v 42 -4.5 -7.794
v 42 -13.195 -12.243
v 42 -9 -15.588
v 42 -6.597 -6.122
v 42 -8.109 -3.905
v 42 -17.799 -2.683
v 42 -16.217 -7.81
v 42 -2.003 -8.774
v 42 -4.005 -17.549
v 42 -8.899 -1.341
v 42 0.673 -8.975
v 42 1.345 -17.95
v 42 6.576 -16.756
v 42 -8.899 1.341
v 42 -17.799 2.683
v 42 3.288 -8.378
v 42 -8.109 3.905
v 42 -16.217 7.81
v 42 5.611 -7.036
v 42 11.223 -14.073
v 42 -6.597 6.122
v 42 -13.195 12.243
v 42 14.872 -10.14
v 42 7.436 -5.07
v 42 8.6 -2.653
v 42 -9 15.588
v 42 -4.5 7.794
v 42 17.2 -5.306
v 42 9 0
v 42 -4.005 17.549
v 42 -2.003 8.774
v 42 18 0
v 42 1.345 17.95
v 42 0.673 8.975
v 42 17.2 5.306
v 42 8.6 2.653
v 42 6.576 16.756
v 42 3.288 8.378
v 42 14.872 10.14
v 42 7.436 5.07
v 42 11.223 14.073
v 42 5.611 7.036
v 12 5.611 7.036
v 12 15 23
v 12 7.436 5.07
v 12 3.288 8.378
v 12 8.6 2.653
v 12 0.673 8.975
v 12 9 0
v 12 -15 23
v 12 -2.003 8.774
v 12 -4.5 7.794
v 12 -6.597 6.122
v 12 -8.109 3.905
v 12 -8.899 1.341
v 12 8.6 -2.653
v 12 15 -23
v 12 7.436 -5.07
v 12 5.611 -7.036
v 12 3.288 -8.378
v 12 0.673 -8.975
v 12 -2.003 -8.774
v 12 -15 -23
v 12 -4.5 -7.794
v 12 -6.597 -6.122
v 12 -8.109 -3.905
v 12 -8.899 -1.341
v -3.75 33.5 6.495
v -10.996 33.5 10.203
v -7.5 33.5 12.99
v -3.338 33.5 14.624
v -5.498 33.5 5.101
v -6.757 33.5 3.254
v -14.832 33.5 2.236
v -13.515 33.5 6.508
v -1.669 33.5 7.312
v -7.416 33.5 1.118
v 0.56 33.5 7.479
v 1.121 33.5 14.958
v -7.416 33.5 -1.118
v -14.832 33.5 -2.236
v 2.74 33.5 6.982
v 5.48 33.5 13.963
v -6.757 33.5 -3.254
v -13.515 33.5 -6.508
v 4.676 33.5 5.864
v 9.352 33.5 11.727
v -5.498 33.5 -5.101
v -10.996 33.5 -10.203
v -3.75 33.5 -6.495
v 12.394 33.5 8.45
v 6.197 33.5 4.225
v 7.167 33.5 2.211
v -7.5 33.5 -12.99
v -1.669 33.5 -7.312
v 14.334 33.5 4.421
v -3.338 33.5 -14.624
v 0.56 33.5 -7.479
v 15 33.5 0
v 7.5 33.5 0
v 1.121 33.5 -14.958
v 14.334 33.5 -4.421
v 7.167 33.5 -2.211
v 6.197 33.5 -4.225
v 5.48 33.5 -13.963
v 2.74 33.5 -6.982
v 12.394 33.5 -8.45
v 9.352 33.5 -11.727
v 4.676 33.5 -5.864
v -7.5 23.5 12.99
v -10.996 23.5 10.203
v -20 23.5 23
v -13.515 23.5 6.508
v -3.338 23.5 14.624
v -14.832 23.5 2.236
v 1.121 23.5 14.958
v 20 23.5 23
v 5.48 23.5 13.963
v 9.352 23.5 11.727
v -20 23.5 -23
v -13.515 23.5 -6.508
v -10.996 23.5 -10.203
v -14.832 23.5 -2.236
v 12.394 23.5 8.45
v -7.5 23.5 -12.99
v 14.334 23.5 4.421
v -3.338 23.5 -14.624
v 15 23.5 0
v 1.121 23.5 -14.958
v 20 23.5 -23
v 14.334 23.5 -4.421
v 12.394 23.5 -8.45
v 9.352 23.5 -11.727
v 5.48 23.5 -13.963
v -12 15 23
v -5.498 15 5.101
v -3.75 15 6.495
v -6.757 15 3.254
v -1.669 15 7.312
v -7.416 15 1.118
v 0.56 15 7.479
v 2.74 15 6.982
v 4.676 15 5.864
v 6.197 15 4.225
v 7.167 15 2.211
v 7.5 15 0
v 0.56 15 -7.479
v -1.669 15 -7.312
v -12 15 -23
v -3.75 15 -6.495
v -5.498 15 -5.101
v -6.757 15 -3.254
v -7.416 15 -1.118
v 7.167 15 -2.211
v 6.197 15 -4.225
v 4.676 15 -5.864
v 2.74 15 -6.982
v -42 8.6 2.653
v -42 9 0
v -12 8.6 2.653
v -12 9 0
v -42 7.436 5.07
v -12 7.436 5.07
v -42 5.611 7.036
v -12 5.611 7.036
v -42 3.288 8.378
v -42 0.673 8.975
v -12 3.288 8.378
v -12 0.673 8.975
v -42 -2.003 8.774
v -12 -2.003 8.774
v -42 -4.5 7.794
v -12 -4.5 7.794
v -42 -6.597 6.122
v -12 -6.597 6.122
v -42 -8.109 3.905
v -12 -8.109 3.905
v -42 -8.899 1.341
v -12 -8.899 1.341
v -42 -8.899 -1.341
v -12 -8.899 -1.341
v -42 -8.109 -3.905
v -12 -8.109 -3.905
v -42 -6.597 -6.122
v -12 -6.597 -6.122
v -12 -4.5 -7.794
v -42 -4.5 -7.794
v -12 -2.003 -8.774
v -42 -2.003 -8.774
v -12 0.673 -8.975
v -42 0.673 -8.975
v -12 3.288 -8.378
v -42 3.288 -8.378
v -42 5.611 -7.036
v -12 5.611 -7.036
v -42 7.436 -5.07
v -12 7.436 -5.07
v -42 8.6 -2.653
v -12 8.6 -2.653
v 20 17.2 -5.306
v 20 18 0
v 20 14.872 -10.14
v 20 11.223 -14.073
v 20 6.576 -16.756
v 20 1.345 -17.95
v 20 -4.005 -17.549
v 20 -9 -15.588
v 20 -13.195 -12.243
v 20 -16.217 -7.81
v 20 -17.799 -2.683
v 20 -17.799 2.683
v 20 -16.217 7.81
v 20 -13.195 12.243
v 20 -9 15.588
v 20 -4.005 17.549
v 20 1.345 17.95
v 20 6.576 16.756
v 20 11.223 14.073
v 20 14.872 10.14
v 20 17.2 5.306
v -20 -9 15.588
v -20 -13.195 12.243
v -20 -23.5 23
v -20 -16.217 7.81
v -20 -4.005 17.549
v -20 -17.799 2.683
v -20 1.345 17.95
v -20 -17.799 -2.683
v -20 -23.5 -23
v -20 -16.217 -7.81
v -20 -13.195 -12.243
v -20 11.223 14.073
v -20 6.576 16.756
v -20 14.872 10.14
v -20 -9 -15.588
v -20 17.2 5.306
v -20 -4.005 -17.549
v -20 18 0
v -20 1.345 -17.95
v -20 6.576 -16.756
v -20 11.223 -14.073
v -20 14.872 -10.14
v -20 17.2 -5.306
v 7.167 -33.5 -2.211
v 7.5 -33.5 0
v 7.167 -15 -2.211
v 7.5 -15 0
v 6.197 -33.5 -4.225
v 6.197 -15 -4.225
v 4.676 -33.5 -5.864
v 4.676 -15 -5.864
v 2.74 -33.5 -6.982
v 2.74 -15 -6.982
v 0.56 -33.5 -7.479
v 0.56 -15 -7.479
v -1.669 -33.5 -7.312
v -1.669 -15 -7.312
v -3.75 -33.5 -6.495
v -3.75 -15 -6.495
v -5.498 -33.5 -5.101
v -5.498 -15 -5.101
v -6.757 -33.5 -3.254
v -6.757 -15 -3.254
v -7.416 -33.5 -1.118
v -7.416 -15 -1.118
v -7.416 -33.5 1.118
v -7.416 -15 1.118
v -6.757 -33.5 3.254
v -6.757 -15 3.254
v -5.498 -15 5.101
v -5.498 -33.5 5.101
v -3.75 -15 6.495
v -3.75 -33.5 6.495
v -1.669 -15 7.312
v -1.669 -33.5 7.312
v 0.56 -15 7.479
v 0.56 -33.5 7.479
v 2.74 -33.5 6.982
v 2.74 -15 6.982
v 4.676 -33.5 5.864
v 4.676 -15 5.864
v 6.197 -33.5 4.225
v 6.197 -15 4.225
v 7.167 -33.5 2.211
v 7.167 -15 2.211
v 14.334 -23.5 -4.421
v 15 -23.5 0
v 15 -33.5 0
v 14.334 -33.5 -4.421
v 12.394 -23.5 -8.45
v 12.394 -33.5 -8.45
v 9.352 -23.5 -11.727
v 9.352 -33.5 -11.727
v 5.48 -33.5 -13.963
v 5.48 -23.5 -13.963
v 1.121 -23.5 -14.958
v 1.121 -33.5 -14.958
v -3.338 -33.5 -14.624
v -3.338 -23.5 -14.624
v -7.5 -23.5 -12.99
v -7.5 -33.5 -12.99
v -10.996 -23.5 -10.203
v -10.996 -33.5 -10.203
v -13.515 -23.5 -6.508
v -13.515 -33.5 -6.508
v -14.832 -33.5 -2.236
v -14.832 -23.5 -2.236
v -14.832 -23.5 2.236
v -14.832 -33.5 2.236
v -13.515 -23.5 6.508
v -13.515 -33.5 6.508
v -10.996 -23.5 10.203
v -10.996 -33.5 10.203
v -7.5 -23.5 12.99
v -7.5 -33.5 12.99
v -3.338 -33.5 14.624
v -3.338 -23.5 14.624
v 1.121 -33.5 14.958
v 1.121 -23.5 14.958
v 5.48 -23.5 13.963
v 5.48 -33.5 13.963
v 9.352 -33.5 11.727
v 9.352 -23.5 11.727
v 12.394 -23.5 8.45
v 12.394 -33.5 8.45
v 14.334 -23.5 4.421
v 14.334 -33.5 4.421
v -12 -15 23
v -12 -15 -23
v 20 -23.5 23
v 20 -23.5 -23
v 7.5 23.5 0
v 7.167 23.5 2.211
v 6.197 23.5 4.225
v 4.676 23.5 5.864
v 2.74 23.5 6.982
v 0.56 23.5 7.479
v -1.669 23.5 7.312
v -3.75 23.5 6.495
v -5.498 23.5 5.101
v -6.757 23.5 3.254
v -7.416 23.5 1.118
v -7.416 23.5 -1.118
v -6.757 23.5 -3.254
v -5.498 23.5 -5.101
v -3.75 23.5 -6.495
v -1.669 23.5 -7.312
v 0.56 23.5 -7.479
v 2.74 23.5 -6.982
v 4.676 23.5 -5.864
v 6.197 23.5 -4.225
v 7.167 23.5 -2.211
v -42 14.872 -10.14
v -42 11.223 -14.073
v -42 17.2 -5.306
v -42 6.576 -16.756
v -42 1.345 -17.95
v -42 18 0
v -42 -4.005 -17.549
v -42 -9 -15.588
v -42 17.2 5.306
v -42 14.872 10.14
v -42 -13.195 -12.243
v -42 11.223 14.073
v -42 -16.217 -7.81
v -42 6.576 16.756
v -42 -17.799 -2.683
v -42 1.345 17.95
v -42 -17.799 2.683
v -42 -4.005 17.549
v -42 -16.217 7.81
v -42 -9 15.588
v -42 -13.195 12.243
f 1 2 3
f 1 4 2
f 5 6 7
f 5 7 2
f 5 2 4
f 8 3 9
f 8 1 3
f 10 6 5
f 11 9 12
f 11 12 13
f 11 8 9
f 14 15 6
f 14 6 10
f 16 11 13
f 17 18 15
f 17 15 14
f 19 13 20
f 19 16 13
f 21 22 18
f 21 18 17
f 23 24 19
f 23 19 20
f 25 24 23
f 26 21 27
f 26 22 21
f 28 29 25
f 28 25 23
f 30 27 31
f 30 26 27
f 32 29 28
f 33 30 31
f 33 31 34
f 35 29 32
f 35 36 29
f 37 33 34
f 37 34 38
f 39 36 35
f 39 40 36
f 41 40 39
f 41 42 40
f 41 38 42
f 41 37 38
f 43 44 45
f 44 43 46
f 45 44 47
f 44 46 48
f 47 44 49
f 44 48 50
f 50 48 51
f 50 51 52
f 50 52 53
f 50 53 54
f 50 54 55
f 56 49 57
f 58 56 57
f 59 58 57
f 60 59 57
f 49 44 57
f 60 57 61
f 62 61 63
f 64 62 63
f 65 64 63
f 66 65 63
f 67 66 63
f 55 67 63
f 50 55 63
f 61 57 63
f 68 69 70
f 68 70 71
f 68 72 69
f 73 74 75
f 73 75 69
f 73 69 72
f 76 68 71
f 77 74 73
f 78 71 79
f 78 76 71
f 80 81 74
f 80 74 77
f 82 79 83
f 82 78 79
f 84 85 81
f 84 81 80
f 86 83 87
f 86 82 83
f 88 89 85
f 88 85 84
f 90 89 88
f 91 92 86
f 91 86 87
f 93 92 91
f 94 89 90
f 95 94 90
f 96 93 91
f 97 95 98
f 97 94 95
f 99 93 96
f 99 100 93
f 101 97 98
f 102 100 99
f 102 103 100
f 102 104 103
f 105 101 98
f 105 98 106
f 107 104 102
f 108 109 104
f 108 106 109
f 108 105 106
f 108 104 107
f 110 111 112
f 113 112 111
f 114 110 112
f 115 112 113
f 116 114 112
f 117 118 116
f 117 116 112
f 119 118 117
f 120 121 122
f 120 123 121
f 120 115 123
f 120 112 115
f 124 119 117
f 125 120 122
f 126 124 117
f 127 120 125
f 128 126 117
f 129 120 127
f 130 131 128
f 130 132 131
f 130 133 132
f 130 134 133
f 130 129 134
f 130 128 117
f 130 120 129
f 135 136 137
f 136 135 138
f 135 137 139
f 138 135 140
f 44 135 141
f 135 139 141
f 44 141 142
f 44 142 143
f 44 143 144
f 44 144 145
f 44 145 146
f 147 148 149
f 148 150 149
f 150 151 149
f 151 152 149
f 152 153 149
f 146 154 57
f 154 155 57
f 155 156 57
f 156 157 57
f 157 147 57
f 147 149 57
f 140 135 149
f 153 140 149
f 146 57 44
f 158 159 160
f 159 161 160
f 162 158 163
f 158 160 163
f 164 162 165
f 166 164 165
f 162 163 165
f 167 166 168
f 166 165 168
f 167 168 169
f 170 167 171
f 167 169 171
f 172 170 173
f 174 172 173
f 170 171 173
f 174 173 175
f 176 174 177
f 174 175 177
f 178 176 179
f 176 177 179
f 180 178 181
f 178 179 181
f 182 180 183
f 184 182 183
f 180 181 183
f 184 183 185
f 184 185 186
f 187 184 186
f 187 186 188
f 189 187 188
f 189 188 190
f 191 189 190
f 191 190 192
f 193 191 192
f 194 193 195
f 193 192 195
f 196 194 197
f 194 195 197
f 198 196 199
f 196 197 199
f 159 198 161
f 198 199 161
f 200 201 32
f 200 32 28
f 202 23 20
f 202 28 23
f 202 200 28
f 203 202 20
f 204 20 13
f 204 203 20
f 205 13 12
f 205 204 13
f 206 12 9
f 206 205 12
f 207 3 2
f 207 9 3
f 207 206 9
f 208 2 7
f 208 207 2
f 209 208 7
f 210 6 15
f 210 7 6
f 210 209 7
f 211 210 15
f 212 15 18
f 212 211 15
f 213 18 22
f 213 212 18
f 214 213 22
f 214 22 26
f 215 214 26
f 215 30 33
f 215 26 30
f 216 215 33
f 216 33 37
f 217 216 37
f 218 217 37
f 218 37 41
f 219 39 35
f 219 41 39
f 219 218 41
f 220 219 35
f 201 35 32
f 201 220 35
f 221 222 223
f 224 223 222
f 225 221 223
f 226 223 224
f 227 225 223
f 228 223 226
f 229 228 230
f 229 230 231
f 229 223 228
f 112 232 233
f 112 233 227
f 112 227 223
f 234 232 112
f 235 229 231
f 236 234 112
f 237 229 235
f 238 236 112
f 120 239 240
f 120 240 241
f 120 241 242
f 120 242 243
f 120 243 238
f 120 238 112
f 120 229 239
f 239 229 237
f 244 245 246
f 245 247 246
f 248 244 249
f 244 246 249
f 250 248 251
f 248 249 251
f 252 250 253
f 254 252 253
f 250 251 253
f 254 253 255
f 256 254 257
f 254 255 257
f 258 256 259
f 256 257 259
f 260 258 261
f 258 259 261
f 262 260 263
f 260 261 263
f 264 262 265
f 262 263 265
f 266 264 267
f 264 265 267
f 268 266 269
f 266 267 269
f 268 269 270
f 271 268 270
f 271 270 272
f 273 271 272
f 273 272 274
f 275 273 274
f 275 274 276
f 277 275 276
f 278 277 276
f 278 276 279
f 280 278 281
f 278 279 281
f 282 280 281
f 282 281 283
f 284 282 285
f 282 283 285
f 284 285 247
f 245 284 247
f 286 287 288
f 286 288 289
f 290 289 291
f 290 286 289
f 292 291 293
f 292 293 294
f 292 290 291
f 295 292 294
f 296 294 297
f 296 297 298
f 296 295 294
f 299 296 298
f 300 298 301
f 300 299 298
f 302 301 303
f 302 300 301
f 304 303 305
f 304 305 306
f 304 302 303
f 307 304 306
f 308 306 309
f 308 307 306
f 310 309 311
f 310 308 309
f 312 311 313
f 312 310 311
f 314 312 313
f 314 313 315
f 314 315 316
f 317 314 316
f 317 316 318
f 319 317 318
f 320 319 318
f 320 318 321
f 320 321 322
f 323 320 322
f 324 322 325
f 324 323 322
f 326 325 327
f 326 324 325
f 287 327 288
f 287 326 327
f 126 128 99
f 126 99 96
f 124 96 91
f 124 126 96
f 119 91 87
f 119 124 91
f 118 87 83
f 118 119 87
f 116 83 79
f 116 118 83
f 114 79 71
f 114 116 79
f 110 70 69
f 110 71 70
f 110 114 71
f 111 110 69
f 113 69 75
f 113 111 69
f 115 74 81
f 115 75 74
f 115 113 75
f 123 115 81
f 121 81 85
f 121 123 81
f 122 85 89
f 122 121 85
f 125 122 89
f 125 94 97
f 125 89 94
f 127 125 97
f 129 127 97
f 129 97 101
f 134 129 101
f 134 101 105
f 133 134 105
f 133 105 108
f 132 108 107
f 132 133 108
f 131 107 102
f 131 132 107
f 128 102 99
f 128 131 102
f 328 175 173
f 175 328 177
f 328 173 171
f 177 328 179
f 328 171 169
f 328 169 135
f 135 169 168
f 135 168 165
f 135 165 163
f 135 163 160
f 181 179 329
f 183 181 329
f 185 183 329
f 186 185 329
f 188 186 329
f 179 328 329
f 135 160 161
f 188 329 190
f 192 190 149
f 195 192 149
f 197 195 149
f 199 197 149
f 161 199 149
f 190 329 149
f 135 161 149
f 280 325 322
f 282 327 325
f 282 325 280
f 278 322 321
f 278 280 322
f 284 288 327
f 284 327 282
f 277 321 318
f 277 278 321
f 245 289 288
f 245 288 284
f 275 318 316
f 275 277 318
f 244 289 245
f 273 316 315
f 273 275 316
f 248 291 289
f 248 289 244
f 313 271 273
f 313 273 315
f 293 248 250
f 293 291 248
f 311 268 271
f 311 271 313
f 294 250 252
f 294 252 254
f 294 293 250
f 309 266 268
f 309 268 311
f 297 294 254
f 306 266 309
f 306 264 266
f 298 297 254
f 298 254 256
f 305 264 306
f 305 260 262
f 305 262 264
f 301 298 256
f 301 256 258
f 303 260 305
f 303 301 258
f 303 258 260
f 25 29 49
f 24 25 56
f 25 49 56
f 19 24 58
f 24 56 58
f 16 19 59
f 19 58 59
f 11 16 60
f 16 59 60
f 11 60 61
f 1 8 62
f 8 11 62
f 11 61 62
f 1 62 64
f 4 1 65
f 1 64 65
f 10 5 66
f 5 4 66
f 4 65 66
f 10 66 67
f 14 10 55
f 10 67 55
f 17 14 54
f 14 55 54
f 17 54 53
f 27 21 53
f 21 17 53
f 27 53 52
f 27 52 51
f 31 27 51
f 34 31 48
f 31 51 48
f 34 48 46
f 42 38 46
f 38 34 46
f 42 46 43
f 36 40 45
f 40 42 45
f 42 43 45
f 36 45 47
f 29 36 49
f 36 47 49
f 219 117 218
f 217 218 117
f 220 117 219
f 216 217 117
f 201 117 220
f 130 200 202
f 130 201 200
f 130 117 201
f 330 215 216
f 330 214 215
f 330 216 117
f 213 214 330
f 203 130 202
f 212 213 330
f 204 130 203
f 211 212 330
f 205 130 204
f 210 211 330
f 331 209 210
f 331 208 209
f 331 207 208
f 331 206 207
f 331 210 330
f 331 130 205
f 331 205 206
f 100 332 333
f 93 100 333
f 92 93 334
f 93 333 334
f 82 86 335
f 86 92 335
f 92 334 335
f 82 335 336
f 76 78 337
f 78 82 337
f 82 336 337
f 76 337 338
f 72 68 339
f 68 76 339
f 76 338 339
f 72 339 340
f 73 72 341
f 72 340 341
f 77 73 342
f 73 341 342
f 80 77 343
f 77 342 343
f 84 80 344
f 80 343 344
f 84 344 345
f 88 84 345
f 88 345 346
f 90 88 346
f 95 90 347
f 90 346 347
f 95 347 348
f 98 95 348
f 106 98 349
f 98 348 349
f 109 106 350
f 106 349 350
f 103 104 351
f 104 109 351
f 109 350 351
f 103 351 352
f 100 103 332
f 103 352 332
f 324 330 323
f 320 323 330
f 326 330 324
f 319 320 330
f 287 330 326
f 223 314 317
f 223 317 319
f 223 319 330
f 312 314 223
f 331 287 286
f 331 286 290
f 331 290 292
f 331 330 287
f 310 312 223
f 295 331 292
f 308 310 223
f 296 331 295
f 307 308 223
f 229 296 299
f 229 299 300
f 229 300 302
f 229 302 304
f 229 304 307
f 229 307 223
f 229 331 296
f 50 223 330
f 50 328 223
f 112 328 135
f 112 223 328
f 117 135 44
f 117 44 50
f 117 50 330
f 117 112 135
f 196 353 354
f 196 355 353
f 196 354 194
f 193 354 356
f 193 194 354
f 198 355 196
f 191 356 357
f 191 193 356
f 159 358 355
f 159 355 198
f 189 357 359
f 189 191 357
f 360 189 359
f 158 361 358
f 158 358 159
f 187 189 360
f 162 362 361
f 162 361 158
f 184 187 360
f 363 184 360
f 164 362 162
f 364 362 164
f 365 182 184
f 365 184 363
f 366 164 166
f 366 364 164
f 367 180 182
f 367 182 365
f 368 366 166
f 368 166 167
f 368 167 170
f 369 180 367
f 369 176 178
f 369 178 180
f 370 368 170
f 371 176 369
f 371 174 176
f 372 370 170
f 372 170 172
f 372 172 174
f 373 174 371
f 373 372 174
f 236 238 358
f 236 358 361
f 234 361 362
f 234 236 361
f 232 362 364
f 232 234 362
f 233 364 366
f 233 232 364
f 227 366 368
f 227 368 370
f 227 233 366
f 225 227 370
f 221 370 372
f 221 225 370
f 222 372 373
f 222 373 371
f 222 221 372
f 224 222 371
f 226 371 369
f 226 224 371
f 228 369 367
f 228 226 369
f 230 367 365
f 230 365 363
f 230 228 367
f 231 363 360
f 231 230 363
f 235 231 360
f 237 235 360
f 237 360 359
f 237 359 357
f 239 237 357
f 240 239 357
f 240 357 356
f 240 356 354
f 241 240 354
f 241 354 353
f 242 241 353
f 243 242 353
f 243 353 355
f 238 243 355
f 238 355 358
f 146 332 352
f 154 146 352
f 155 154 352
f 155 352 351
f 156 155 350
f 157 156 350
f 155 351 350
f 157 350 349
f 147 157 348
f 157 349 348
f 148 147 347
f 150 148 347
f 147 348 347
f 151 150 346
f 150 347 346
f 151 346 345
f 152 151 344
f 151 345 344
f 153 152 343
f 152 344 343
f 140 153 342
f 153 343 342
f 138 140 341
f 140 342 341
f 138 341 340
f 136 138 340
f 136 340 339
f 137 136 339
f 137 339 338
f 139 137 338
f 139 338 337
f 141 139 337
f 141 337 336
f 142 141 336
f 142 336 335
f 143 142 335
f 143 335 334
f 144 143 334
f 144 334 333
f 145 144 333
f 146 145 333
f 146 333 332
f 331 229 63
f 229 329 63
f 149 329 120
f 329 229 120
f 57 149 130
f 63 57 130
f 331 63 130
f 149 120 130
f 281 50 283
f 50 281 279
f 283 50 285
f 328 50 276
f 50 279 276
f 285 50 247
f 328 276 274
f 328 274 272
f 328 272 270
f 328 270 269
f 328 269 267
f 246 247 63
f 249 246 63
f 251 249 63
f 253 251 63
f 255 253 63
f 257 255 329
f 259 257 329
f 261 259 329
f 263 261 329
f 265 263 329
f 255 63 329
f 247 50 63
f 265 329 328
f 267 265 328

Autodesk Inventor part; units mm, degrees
ref_plane "YZ Plane" through (0, 0, 0) normal (1, 0, 0) x (0, 1, 0)
ref_plane "XZ Plane" through (0, 0, 0) normal (0, 1, 0) x (-1, 0, 0)
ref_plane "XY Plane" through (0, 0, 0) normal (0, 0, 1) x (1, 0, 0)
sketch "Sketch1" plane through (0, 0, 0) normal (0, 0, 1) x (1, 0, 0)
  line L0 (-20, 23.5) -> (20, 23.5)
  line L1 (20, 23.5) -> (20, -23.5)
  line L2 (20, -23.5) -> (-20, -23.5)
  line L3 (-20, -23.5) -> (-20, 23.5)
  line L4 (-12, 15) -> (12, 15)
  line L5 (12, 15) -> (12, -15)
  line L6 (12, -15) -> (-12, -15)
  line L7 (-12, -15) -> (-12, 15)
  point P0 (0, 0)
  point P1 (20, 0)
  point P2 (0, 23.5)
  point P3 (12, 0)
  point P4 (0, 15)
  dimension "d0" = 40
  dimension "d1" = 47
  dimension "d2" = 24
  dimension "d12" = 30
extrude "Extrusion1" add sketch "Sketch1" along normal mid plane 46
sketch "Sketch2" plane through (0, 0, 0) normal (1, 0, 0) x (0, 1, 0)
  circle A0 centre (0, 0) radius 9
  circle A1 centre (0, 0) radius 18
  dimension "d5" = 18
  dimension "d6" = 36
extrude "Extrusion2" cut sketch "Sketch2" along normal through all both and the other way through all contours A0
extrude "Extrusion3" add sketch "Sketch2" along normal blind 22 from surface at 20
mirror "Mirror1" about plane through (0, 0, 0) normal (1, 0, 0) of "Extrusion3"
sketch "Sketch3" plane through (-20, 23.5, 23) normal (0, 1, 0) x (1, 0, 0)
  circle A0 centre (20, 23) radius 7.5
  circle A1 centre (20, 23) radius 15
  dimension "d13" = 15
  dimension "d14" = 30
extrude "Extrusion4" cut sketch "Sketch3" against normal through all contours A0
extrude "Extrusion5" add sketch "Sketch3" along normal blind 10
mirror "Mirror2" about plane through (0, 0, 0) normal (0, 1, 0) of "Extrusion5"
ref_plane "Work Plane1" through (0, 0, 0) normal (0, 1, 0) x (-1, 0, 0)
properties part number "DP816"
